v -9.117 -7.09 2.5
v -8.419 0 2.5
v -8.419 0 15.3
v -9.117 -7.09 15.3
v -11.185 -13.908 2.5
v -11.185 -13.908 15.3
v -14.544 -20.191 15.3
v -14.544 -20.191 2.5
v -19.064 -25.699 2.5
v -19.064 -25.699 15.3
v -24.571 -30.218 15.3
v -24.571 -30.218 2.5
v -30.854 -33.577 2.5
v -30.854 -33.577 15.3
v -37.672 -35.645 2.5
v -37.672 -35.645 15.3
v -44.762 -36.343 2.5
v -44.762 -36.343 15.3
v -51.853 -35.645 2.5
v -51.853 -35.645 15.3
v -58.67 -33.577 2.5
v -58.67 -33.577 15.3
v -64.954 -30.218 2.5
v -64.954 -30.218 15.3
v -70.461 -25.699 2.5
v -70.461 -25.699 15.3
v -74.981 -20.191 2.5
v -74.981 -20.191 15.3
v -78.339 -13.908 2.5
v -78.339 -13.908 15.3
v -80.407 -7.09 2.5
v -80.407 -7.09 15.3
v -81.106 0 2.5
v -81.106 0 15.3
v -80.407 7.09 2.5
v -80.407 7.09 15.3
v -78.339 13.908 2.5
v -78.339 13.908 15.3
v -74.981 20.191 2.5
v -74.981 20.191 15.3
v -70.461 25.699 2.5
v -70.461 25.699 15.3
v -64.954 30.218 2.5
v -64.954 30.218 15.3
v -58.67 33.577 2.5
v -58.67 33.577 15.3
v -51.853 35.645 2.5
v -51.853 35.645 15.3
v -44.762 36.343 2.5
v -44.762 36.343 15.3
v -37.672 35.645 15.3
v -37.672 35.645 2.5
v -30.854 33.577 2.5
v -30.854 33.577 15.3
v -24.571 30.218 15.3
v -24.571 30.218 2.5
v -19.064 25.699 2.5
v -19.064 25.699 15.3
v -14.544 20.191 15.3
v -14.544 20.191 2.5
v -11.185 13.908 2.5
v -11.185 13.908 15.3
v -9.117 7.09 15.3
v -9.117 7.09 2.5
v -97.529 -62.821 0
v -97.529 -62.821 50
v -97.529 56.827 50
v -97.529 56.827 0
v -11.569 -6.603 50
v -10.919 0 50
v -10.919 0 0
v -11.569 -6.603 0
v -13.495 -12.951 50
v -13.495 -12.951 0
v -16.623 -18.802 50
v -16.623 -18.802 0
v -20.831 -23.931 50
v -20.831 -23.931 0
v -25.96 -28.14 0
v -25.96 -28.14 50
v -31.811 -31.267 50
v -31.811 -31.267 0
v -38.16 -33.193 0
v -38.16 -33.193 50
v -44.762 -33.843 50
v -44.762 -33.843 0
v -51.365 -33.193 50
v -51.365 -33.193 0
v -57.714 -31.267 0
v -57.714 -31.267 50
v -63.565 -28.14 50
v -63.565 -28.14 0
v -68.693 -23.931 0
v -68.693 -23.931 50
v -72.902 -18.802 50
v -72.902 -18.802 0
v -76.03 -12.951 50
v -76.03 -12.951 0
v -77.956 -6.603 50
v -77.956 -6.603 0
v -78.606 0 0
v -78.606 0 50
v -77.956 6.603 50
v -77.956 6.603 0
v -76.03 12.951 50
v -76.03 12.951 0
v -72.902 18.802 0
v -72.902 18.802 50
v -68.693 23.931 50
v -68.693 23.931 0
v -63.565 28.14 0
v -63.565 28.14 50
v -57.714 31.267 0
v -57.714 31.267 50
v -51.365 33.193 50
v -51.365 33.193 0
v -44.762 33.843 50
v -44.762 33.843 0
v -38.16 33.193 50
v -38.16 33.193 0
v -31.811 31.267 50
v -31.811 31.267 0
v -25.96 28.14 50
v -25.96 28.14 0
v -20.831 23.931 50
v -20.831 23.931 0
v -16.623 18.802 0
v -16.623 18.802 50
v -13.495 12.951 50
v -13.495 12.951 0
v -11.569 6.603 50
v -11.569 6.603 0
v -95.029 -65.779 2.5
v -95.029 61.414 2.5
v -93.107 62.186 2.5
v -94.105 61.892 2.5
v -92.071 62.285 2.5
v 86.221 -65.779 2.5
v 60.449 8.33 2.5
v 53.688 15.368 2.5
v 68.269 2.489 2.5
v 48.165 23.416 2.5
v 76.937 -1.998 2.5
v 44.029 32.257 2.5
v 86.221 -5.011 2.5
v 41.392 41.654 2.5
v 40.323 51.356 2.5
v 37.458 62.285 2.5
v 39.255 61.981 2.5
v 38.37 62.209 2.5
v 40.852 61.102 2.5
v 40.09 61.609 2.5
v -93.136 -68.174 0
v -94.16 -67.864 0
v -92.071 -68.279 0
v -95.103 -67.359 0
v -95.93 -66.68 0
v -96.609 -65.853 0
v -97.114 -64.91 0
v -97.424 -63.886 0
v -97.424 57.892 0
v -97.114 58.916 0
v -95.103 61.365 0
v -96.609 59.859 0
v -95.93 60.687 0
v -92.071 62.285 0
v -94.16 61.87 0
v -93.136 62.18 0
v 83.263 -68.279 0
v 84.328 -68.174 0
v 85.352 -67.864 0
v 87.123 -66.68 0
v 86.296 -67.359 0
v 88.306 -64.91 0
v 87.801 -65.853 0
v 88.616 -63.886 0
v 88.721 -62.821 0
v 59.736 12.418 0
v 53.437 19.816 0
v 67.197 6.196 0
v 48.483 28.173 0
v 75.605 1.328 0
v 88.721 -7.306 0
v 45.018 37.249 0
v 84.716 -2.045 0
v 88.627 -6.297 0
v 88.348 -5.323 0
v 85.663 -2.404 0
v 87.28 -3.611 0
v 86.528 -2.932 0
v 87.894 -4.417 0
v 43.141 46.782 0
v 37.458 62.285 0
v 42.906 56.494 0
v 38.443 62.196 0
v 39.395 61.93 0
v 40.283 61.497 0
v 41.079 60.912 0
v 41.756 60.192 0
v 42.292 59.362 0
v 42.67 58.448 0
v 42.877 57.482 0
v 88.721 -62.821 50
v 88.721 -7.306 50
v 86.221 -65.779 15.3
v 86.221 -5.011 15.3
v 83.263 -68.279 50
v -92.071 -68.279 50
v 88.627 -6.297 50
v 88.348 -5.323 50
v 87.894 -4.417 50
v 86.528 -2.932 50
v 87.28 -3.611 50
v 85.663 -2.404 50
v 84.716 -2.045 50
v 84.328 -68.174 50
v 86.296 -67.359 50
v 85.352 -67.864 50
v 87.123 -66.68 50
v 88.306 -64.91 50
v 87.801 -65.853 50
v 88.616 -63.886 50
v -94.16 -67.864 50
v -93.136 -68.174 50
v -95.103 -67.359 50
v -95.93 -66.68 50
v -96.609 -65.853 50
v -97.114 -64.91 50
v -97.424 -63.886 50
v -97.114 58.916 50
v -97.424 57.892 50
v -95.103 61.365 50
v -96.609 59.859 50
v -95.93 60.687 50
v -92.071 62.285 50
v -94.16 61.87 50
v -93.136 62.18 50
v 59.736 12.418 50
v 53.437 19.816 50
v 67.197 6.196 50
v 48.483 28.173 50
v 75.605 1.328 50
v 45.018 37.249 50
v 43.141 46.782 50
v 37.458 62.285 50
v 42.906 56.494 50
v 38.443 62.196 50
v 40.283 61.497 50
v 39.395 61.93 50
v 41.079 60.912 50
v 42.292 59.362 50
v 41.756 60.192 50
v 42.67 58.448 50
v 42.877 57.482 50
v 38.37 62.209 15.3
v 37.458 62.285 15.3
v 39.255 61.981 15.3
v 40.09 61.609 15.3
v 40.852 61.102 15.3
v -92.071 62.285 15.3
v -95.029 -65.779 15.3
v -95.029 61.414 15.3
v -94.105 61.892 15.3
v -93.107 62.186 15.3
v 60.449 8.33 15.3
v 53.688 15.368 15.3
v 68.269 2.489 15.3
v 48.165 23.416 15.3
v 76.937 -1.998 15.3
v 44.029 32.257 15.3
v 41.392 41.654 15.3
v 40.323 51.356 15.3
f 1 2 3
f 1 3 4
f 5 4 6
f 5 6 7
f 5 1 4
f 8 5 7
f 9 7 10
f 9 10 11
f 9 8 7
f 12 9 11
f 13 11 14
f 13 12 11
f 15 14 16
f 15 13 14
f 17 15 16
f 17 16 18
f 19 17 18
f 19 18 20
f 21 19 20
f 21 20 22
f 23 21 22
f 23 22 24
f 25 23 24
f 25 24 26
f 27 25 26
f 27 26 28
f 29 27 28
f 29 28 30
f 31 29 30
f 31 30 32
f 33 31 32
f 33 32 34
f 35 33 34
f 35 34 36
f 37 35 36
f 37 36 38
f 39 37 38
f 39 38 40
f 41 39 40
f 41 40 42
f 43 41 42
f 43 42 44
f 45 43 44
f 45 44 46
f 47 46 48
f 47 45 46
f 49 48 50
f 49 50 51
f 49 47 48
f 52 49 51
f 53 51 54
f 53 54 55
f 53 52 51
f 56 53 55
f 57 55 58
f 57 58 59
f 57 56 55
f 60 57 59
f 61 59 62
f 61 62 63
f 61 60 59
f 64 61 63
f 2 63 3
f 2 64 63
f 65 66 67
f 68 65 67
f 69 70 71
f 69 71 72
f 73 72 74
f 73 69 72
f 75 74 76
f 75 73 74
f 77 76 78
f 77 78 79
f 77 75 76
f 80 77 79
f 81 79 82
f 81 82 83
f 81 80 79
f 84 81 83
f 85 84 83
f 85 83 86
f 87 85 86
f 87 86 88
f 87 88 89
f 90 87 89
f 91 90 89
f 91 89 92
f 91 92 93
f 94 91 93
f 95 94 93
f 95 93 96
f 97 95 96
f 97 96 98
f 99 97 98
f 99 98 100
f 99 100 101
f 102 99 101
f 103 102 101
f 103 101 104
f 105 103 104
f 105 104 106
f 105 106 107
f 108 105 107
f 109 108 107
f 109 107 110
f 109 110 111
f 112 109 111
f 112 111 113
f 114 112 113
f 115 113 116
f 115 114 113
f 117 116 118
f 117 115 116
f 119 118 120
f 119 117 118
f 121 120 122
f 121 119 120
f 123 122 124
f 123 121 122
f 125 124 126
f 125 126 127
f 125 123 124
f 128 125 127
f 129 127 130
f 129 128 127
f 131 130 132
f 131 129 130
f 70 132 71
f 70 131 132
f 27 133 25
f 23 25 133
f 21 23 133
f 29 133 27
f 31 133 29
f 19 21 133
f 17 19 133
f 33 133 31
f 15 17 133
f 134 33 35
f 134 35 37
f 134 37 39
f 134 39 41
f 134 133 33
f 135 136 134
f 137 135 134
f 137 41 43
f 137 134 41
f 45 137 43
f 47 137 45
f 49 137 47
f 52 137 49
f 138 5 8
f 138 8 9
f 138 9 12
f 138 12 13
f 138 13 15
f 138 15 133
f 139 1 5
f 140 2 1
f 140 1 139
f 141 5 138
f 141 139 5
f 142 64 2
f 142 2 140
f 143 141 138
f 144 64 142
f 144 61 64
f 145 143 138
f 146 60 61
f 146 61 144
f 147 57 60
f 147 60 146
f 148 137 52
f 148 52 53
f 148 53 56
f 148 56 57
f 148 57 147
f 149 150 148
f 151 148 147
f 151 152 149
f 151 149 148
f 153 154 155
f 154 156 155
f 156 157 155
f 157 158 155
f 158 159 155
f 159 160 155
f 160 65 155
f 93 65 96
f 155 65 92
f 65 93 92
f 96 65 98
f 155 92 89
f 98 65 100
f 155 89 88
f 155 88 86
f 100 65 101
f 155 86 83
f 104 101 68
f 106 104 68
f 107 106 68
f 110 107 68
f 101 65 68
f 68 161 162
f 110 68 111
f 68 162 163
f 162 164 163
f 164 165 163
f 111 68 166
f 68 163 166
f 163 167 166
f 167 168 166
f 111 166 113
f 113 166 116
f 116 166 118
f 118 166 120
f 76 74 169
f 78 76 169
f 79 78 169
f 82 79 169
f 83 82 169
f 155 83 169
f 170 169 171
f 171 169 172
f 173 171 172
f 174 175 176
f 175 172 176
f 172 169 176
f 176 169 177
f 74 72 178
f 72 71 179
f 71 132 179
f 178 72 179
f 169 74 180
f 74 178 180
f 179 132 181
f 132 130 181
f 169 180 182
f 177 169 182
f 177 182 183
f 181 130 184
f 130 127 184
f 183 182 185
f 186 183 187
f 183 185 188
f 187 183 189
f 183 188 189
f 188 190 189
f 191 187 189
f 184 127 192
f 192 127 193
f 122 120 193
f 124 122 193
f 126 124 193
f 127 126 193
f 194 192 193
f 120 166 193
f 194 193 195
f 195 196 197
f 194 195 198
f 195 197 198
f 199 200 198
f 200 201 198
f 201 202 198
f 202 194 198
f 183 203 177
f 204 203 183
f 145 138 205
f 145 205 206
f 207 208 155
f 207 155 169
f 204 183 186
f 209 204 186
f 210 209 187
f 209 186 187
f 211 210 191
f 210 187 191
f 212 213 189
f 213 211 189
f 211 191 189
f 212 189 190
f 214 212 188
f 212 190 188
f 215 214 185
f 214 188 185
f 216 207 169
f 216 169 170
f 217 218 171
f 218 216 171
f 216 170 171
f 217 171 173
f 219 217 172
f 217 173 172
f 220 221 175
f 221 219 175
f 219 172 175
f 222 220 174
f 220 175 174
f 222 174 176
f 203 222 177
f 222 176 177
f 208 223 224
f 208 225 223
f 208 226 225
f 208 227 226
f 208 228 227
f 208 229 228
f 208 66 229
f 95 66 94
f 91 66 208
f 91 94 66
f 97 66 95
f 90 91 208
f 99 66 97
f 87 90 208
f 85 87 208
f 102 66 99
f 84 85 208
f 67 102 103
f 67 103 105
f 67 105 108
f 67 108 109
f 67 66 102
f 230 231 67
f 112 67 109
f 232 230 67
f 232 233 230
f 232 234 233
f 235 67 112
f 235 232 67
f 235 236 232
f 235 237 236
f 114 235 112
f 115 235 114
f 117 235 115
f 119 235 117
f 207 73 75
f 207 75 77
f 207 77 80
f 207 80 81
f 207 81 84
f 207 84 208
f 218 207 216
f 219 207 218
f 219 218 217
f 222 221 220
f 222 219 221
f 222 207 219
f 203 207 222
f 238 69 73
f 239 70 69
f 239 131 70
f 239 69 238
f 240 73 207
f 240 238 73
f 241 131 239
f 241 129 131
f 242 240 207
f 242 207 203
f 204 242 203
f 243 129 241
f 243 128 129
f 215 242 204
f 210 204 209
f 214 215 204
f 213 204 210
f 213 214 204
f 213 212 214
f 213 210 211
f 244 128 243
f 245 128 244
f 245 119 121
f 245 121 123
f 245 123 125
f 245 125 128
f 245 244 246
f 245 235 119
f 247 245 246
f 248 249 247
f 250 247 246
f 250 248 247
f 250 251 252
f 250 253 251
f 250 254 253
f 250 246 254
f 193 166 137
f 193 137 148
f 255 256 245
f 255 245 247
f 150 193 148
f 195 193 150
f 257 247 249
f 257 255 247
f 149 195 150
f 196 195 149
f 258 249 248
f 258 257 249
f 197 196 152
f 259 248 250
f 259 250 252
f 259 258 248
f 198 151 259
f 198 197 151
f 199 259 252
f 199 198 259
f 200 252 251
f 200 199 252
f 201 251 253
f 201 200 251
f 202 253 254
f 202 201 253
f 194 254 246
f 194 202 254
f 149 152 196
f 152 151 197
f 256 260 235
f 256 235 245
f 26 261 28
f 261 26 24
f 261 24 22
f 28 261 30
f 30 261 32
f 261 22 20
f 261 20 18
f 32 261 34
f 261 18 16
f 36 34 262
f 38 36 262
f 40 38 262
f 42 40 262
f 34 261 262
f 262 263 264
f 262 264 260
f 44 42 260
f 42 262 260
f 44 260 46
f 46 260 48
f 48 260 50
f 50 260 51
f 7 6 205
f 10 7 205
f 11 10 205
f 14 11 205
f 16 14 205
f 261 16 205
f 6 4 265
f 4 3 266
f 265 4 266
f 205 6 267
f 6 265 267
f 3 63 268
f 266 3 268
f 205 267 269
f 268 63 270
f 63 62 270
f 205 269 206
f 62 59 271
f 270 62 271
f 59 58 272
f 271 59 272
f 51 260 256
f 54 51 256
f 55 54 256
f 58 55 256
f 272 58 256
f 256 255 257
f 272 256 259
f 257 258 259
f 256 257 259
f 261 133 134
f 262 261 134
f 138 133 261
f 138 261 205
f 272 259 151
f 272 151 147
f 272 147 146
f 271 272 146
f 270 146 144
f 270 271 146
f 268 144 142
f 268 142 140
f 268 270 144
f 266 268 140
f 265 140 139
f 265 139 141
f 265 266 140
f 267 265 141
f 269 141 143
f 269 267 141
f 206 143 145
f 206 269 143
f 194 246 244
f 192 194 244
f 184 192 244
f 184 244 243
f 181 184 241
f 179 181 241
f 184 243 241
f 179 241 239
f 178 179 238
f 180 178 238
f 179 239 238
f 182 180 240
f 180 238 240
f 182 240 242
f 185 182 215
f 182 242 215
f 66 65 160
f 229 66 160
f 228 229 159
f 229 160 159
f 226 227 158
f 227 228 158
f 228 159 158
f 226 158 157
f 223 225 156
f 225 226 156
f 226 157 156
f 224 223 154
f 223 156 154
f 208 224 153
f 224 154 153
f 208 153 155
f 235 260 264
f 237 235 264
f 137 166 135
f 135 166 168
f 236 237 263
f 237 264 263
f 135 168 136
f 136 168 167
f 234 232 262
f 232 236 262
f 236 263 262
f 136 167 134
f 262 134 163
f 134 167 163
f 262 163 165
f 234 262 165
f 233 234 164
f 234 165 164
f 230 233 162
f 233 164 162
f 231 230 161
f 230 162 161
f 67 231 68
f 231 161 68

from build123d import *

# Parameters (mm, degrees)
F0_W        = 186.2502396107
F0_H        = 130.5641233921
F1_DEPTH    = 50
F2_R        = 33.843412588
F3_DEPTH    = 153
F5_DEPTH    = 98
F6_T        = -2.5
F7_DEPTH    = 34.7
F8_T1_DEPTH = 77.2897189396
F8_T3_DEPTH = 80.4969668156
F8_T5_DEPTH = 71.5460241694


# Not quite as in the source:
# - a fillet or chamfer that OpenCascade refuses, or shapes differently, is made with other operations: its cross-section is extruded or revolved along the edge and cut away or added


with BuildPart() as f1:
    # F0 (on Top) → F1 (new body)
    with BuildSketch(Plane.XY):
        with Locations((-4.4038519263, -2.9969513416)):
            Rectangle(F0_W, F0_H)
    extrude(amount=F1_DEPTH)

    # F2 (on face) → F3 (cut)
    with BuildSketch(Plane(origin=(0, 0, 0), x_dir=(1, 0, 0), z_dir=(0, 0, -1))):
        with Locations((-44.7623804212, 0)):
            Circle(F2_R)
    extrude(amount=-F3_DEPTH, mode=Mode.SUBTRACT)

    # F4 (on face) → F5 (cut)
    with BuildSketch(Plane.XY.offset(50)):
        with BuildLine():
            Line((88.721267879, 62.2851103544), (43.5578748584, 62.2851103544))
            ThreePointArc((43.5578748584, 62.2851103544), (52.9449353899, 20.5157751148), (88.721267879, -2.9969513416))
            Line((88.721267879, -2.9969513416), (88.721267879, 62.2851103544))
        make_face()
    extrude(amount=-F5_DEPTH, mode=Mode.SUBTRACT)

    # F6
    f6_openings = [f1.faces().sort_by_distance(p)[0] for p in [
        (-26.985548, 62.28511, 25),
    ]]
    offset(amount=F6_T, openings=f6_openings)

    # F7 (add): a face of the model
    f7_faces = [f1.faces().sort_by_distance(p)[0] for p in [
        (-5.8734353471, -8.457374128, 50),
    ]]
    extrude(f7_faces, amount=-F7_DEPTH)

    # F8: fillet of radius 5.4579437879 on 5 edges, made by hand

    # F8_s2 → F8_t1 (cut)
    with BuildSketch(Plane.XY.offset(-13.6448594698)):
        with BuildLine():
            ThreePointArc((-97.5289717317, -62.8210692498), (-95.9303770075, -66.6804183135), (-92.0710279438, -68.2790130377))
            Line((-92.0710279438, -68.2790130377), (-97.5289717317, -68.2790130377))
            Line((-97.5289717317, -68.2790130377), (-97.5289717317, -62.8210692498))
        make_face()
        with BuildLine():
            ThreePointArc((83.2633240911, -68.2790130377), (87.1226731549, -66.6804183135), (88.721267879, -62.8210692498))
            Line((88.721267879, -62.8210692498), (88.721267879, -68.2790130377))
            Line((88.721267879, -68.2790130377), (83.2633240911, -68.2790130377))
        make_face()
        with BuildLine():
            ThreePointArc((-92.0710279438, 62.2851103544), (-95.9303770075, 60.6865156303), (-97.5289717317, 56.8271665665))
            Line((-97.5289717317, 56.8271665665), (-97.5289717317, 62.2851103544))
            Line((-97.5289717317, 62.2851103544), (-92.0710279438, 62.2851103544))
        make_face()
    extrude(amount=F8_T1_DEPTH, mode=Mode.SUBTRACT)

    # F8_s4 → F8_t3 (cut)
    with BuildSketch(Plane.XY.offset(-15.2484834078)):
        with BuildLine():
            ThreePointArc((37.4584814953, 62.2851103544), (41.4337624229, 60.5669916879), (42.9062677149, 56.4943367342))
            ThreePointArc((42.9062677149, 56.4943367342), (43.1581721547, 59.3980390485), (43.5578748584, 62.2851103544))
            Line((43.5578748584, 62.2851103544), (37.4584814953, 62.2851103544))
        make_face()
    extrude(amount=F8_T3_DEPTH, mode=Mode.SUBTRACT)

    # F8_s6 → F8_t5 (cut)
    with BuildSketch(Plane.XY.offset(-10.7730120847)):
        with BuildLine():
            ThreePointArc((88.721267879, -7.3061561755), (87.605956573, -3.99999624), (84.7158424133, -2.0450402373))
            ThreePointArc((84.7158424133, -2.0450402373), (86.7099755288, -2.557096868), (88.721267879, -2.9969513416))
            Line((88.721267879, -2.9969513416), (88.721267879, -7.3061561755))
        make_face()
    extrude(amount=F8_T5_DEPTH, mode=Mode.SUBTRACT)


solid = f1.part
